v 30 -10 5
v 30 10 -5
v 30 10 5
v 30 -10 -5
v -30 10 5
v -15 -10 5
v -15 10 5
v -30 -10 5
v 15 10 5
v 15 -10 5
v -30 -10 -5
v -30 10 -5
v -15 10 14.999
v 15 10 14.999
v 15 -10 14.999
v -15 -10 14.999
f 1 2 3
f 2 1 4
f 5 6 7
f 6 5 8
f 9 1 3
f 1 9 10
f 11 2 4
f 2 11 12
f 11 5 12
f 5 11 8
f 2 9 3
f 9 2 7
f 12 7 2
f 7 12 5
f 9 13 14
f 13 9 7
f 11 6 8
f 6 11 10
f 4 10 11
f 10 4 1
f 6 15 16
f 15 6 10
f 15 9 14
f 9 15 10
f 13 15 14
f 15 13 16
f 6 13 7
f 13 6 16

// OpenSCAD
cube([60,20,10],center=true);
translate([0,0,9.999])
    cube([30,20,10],center=true);
